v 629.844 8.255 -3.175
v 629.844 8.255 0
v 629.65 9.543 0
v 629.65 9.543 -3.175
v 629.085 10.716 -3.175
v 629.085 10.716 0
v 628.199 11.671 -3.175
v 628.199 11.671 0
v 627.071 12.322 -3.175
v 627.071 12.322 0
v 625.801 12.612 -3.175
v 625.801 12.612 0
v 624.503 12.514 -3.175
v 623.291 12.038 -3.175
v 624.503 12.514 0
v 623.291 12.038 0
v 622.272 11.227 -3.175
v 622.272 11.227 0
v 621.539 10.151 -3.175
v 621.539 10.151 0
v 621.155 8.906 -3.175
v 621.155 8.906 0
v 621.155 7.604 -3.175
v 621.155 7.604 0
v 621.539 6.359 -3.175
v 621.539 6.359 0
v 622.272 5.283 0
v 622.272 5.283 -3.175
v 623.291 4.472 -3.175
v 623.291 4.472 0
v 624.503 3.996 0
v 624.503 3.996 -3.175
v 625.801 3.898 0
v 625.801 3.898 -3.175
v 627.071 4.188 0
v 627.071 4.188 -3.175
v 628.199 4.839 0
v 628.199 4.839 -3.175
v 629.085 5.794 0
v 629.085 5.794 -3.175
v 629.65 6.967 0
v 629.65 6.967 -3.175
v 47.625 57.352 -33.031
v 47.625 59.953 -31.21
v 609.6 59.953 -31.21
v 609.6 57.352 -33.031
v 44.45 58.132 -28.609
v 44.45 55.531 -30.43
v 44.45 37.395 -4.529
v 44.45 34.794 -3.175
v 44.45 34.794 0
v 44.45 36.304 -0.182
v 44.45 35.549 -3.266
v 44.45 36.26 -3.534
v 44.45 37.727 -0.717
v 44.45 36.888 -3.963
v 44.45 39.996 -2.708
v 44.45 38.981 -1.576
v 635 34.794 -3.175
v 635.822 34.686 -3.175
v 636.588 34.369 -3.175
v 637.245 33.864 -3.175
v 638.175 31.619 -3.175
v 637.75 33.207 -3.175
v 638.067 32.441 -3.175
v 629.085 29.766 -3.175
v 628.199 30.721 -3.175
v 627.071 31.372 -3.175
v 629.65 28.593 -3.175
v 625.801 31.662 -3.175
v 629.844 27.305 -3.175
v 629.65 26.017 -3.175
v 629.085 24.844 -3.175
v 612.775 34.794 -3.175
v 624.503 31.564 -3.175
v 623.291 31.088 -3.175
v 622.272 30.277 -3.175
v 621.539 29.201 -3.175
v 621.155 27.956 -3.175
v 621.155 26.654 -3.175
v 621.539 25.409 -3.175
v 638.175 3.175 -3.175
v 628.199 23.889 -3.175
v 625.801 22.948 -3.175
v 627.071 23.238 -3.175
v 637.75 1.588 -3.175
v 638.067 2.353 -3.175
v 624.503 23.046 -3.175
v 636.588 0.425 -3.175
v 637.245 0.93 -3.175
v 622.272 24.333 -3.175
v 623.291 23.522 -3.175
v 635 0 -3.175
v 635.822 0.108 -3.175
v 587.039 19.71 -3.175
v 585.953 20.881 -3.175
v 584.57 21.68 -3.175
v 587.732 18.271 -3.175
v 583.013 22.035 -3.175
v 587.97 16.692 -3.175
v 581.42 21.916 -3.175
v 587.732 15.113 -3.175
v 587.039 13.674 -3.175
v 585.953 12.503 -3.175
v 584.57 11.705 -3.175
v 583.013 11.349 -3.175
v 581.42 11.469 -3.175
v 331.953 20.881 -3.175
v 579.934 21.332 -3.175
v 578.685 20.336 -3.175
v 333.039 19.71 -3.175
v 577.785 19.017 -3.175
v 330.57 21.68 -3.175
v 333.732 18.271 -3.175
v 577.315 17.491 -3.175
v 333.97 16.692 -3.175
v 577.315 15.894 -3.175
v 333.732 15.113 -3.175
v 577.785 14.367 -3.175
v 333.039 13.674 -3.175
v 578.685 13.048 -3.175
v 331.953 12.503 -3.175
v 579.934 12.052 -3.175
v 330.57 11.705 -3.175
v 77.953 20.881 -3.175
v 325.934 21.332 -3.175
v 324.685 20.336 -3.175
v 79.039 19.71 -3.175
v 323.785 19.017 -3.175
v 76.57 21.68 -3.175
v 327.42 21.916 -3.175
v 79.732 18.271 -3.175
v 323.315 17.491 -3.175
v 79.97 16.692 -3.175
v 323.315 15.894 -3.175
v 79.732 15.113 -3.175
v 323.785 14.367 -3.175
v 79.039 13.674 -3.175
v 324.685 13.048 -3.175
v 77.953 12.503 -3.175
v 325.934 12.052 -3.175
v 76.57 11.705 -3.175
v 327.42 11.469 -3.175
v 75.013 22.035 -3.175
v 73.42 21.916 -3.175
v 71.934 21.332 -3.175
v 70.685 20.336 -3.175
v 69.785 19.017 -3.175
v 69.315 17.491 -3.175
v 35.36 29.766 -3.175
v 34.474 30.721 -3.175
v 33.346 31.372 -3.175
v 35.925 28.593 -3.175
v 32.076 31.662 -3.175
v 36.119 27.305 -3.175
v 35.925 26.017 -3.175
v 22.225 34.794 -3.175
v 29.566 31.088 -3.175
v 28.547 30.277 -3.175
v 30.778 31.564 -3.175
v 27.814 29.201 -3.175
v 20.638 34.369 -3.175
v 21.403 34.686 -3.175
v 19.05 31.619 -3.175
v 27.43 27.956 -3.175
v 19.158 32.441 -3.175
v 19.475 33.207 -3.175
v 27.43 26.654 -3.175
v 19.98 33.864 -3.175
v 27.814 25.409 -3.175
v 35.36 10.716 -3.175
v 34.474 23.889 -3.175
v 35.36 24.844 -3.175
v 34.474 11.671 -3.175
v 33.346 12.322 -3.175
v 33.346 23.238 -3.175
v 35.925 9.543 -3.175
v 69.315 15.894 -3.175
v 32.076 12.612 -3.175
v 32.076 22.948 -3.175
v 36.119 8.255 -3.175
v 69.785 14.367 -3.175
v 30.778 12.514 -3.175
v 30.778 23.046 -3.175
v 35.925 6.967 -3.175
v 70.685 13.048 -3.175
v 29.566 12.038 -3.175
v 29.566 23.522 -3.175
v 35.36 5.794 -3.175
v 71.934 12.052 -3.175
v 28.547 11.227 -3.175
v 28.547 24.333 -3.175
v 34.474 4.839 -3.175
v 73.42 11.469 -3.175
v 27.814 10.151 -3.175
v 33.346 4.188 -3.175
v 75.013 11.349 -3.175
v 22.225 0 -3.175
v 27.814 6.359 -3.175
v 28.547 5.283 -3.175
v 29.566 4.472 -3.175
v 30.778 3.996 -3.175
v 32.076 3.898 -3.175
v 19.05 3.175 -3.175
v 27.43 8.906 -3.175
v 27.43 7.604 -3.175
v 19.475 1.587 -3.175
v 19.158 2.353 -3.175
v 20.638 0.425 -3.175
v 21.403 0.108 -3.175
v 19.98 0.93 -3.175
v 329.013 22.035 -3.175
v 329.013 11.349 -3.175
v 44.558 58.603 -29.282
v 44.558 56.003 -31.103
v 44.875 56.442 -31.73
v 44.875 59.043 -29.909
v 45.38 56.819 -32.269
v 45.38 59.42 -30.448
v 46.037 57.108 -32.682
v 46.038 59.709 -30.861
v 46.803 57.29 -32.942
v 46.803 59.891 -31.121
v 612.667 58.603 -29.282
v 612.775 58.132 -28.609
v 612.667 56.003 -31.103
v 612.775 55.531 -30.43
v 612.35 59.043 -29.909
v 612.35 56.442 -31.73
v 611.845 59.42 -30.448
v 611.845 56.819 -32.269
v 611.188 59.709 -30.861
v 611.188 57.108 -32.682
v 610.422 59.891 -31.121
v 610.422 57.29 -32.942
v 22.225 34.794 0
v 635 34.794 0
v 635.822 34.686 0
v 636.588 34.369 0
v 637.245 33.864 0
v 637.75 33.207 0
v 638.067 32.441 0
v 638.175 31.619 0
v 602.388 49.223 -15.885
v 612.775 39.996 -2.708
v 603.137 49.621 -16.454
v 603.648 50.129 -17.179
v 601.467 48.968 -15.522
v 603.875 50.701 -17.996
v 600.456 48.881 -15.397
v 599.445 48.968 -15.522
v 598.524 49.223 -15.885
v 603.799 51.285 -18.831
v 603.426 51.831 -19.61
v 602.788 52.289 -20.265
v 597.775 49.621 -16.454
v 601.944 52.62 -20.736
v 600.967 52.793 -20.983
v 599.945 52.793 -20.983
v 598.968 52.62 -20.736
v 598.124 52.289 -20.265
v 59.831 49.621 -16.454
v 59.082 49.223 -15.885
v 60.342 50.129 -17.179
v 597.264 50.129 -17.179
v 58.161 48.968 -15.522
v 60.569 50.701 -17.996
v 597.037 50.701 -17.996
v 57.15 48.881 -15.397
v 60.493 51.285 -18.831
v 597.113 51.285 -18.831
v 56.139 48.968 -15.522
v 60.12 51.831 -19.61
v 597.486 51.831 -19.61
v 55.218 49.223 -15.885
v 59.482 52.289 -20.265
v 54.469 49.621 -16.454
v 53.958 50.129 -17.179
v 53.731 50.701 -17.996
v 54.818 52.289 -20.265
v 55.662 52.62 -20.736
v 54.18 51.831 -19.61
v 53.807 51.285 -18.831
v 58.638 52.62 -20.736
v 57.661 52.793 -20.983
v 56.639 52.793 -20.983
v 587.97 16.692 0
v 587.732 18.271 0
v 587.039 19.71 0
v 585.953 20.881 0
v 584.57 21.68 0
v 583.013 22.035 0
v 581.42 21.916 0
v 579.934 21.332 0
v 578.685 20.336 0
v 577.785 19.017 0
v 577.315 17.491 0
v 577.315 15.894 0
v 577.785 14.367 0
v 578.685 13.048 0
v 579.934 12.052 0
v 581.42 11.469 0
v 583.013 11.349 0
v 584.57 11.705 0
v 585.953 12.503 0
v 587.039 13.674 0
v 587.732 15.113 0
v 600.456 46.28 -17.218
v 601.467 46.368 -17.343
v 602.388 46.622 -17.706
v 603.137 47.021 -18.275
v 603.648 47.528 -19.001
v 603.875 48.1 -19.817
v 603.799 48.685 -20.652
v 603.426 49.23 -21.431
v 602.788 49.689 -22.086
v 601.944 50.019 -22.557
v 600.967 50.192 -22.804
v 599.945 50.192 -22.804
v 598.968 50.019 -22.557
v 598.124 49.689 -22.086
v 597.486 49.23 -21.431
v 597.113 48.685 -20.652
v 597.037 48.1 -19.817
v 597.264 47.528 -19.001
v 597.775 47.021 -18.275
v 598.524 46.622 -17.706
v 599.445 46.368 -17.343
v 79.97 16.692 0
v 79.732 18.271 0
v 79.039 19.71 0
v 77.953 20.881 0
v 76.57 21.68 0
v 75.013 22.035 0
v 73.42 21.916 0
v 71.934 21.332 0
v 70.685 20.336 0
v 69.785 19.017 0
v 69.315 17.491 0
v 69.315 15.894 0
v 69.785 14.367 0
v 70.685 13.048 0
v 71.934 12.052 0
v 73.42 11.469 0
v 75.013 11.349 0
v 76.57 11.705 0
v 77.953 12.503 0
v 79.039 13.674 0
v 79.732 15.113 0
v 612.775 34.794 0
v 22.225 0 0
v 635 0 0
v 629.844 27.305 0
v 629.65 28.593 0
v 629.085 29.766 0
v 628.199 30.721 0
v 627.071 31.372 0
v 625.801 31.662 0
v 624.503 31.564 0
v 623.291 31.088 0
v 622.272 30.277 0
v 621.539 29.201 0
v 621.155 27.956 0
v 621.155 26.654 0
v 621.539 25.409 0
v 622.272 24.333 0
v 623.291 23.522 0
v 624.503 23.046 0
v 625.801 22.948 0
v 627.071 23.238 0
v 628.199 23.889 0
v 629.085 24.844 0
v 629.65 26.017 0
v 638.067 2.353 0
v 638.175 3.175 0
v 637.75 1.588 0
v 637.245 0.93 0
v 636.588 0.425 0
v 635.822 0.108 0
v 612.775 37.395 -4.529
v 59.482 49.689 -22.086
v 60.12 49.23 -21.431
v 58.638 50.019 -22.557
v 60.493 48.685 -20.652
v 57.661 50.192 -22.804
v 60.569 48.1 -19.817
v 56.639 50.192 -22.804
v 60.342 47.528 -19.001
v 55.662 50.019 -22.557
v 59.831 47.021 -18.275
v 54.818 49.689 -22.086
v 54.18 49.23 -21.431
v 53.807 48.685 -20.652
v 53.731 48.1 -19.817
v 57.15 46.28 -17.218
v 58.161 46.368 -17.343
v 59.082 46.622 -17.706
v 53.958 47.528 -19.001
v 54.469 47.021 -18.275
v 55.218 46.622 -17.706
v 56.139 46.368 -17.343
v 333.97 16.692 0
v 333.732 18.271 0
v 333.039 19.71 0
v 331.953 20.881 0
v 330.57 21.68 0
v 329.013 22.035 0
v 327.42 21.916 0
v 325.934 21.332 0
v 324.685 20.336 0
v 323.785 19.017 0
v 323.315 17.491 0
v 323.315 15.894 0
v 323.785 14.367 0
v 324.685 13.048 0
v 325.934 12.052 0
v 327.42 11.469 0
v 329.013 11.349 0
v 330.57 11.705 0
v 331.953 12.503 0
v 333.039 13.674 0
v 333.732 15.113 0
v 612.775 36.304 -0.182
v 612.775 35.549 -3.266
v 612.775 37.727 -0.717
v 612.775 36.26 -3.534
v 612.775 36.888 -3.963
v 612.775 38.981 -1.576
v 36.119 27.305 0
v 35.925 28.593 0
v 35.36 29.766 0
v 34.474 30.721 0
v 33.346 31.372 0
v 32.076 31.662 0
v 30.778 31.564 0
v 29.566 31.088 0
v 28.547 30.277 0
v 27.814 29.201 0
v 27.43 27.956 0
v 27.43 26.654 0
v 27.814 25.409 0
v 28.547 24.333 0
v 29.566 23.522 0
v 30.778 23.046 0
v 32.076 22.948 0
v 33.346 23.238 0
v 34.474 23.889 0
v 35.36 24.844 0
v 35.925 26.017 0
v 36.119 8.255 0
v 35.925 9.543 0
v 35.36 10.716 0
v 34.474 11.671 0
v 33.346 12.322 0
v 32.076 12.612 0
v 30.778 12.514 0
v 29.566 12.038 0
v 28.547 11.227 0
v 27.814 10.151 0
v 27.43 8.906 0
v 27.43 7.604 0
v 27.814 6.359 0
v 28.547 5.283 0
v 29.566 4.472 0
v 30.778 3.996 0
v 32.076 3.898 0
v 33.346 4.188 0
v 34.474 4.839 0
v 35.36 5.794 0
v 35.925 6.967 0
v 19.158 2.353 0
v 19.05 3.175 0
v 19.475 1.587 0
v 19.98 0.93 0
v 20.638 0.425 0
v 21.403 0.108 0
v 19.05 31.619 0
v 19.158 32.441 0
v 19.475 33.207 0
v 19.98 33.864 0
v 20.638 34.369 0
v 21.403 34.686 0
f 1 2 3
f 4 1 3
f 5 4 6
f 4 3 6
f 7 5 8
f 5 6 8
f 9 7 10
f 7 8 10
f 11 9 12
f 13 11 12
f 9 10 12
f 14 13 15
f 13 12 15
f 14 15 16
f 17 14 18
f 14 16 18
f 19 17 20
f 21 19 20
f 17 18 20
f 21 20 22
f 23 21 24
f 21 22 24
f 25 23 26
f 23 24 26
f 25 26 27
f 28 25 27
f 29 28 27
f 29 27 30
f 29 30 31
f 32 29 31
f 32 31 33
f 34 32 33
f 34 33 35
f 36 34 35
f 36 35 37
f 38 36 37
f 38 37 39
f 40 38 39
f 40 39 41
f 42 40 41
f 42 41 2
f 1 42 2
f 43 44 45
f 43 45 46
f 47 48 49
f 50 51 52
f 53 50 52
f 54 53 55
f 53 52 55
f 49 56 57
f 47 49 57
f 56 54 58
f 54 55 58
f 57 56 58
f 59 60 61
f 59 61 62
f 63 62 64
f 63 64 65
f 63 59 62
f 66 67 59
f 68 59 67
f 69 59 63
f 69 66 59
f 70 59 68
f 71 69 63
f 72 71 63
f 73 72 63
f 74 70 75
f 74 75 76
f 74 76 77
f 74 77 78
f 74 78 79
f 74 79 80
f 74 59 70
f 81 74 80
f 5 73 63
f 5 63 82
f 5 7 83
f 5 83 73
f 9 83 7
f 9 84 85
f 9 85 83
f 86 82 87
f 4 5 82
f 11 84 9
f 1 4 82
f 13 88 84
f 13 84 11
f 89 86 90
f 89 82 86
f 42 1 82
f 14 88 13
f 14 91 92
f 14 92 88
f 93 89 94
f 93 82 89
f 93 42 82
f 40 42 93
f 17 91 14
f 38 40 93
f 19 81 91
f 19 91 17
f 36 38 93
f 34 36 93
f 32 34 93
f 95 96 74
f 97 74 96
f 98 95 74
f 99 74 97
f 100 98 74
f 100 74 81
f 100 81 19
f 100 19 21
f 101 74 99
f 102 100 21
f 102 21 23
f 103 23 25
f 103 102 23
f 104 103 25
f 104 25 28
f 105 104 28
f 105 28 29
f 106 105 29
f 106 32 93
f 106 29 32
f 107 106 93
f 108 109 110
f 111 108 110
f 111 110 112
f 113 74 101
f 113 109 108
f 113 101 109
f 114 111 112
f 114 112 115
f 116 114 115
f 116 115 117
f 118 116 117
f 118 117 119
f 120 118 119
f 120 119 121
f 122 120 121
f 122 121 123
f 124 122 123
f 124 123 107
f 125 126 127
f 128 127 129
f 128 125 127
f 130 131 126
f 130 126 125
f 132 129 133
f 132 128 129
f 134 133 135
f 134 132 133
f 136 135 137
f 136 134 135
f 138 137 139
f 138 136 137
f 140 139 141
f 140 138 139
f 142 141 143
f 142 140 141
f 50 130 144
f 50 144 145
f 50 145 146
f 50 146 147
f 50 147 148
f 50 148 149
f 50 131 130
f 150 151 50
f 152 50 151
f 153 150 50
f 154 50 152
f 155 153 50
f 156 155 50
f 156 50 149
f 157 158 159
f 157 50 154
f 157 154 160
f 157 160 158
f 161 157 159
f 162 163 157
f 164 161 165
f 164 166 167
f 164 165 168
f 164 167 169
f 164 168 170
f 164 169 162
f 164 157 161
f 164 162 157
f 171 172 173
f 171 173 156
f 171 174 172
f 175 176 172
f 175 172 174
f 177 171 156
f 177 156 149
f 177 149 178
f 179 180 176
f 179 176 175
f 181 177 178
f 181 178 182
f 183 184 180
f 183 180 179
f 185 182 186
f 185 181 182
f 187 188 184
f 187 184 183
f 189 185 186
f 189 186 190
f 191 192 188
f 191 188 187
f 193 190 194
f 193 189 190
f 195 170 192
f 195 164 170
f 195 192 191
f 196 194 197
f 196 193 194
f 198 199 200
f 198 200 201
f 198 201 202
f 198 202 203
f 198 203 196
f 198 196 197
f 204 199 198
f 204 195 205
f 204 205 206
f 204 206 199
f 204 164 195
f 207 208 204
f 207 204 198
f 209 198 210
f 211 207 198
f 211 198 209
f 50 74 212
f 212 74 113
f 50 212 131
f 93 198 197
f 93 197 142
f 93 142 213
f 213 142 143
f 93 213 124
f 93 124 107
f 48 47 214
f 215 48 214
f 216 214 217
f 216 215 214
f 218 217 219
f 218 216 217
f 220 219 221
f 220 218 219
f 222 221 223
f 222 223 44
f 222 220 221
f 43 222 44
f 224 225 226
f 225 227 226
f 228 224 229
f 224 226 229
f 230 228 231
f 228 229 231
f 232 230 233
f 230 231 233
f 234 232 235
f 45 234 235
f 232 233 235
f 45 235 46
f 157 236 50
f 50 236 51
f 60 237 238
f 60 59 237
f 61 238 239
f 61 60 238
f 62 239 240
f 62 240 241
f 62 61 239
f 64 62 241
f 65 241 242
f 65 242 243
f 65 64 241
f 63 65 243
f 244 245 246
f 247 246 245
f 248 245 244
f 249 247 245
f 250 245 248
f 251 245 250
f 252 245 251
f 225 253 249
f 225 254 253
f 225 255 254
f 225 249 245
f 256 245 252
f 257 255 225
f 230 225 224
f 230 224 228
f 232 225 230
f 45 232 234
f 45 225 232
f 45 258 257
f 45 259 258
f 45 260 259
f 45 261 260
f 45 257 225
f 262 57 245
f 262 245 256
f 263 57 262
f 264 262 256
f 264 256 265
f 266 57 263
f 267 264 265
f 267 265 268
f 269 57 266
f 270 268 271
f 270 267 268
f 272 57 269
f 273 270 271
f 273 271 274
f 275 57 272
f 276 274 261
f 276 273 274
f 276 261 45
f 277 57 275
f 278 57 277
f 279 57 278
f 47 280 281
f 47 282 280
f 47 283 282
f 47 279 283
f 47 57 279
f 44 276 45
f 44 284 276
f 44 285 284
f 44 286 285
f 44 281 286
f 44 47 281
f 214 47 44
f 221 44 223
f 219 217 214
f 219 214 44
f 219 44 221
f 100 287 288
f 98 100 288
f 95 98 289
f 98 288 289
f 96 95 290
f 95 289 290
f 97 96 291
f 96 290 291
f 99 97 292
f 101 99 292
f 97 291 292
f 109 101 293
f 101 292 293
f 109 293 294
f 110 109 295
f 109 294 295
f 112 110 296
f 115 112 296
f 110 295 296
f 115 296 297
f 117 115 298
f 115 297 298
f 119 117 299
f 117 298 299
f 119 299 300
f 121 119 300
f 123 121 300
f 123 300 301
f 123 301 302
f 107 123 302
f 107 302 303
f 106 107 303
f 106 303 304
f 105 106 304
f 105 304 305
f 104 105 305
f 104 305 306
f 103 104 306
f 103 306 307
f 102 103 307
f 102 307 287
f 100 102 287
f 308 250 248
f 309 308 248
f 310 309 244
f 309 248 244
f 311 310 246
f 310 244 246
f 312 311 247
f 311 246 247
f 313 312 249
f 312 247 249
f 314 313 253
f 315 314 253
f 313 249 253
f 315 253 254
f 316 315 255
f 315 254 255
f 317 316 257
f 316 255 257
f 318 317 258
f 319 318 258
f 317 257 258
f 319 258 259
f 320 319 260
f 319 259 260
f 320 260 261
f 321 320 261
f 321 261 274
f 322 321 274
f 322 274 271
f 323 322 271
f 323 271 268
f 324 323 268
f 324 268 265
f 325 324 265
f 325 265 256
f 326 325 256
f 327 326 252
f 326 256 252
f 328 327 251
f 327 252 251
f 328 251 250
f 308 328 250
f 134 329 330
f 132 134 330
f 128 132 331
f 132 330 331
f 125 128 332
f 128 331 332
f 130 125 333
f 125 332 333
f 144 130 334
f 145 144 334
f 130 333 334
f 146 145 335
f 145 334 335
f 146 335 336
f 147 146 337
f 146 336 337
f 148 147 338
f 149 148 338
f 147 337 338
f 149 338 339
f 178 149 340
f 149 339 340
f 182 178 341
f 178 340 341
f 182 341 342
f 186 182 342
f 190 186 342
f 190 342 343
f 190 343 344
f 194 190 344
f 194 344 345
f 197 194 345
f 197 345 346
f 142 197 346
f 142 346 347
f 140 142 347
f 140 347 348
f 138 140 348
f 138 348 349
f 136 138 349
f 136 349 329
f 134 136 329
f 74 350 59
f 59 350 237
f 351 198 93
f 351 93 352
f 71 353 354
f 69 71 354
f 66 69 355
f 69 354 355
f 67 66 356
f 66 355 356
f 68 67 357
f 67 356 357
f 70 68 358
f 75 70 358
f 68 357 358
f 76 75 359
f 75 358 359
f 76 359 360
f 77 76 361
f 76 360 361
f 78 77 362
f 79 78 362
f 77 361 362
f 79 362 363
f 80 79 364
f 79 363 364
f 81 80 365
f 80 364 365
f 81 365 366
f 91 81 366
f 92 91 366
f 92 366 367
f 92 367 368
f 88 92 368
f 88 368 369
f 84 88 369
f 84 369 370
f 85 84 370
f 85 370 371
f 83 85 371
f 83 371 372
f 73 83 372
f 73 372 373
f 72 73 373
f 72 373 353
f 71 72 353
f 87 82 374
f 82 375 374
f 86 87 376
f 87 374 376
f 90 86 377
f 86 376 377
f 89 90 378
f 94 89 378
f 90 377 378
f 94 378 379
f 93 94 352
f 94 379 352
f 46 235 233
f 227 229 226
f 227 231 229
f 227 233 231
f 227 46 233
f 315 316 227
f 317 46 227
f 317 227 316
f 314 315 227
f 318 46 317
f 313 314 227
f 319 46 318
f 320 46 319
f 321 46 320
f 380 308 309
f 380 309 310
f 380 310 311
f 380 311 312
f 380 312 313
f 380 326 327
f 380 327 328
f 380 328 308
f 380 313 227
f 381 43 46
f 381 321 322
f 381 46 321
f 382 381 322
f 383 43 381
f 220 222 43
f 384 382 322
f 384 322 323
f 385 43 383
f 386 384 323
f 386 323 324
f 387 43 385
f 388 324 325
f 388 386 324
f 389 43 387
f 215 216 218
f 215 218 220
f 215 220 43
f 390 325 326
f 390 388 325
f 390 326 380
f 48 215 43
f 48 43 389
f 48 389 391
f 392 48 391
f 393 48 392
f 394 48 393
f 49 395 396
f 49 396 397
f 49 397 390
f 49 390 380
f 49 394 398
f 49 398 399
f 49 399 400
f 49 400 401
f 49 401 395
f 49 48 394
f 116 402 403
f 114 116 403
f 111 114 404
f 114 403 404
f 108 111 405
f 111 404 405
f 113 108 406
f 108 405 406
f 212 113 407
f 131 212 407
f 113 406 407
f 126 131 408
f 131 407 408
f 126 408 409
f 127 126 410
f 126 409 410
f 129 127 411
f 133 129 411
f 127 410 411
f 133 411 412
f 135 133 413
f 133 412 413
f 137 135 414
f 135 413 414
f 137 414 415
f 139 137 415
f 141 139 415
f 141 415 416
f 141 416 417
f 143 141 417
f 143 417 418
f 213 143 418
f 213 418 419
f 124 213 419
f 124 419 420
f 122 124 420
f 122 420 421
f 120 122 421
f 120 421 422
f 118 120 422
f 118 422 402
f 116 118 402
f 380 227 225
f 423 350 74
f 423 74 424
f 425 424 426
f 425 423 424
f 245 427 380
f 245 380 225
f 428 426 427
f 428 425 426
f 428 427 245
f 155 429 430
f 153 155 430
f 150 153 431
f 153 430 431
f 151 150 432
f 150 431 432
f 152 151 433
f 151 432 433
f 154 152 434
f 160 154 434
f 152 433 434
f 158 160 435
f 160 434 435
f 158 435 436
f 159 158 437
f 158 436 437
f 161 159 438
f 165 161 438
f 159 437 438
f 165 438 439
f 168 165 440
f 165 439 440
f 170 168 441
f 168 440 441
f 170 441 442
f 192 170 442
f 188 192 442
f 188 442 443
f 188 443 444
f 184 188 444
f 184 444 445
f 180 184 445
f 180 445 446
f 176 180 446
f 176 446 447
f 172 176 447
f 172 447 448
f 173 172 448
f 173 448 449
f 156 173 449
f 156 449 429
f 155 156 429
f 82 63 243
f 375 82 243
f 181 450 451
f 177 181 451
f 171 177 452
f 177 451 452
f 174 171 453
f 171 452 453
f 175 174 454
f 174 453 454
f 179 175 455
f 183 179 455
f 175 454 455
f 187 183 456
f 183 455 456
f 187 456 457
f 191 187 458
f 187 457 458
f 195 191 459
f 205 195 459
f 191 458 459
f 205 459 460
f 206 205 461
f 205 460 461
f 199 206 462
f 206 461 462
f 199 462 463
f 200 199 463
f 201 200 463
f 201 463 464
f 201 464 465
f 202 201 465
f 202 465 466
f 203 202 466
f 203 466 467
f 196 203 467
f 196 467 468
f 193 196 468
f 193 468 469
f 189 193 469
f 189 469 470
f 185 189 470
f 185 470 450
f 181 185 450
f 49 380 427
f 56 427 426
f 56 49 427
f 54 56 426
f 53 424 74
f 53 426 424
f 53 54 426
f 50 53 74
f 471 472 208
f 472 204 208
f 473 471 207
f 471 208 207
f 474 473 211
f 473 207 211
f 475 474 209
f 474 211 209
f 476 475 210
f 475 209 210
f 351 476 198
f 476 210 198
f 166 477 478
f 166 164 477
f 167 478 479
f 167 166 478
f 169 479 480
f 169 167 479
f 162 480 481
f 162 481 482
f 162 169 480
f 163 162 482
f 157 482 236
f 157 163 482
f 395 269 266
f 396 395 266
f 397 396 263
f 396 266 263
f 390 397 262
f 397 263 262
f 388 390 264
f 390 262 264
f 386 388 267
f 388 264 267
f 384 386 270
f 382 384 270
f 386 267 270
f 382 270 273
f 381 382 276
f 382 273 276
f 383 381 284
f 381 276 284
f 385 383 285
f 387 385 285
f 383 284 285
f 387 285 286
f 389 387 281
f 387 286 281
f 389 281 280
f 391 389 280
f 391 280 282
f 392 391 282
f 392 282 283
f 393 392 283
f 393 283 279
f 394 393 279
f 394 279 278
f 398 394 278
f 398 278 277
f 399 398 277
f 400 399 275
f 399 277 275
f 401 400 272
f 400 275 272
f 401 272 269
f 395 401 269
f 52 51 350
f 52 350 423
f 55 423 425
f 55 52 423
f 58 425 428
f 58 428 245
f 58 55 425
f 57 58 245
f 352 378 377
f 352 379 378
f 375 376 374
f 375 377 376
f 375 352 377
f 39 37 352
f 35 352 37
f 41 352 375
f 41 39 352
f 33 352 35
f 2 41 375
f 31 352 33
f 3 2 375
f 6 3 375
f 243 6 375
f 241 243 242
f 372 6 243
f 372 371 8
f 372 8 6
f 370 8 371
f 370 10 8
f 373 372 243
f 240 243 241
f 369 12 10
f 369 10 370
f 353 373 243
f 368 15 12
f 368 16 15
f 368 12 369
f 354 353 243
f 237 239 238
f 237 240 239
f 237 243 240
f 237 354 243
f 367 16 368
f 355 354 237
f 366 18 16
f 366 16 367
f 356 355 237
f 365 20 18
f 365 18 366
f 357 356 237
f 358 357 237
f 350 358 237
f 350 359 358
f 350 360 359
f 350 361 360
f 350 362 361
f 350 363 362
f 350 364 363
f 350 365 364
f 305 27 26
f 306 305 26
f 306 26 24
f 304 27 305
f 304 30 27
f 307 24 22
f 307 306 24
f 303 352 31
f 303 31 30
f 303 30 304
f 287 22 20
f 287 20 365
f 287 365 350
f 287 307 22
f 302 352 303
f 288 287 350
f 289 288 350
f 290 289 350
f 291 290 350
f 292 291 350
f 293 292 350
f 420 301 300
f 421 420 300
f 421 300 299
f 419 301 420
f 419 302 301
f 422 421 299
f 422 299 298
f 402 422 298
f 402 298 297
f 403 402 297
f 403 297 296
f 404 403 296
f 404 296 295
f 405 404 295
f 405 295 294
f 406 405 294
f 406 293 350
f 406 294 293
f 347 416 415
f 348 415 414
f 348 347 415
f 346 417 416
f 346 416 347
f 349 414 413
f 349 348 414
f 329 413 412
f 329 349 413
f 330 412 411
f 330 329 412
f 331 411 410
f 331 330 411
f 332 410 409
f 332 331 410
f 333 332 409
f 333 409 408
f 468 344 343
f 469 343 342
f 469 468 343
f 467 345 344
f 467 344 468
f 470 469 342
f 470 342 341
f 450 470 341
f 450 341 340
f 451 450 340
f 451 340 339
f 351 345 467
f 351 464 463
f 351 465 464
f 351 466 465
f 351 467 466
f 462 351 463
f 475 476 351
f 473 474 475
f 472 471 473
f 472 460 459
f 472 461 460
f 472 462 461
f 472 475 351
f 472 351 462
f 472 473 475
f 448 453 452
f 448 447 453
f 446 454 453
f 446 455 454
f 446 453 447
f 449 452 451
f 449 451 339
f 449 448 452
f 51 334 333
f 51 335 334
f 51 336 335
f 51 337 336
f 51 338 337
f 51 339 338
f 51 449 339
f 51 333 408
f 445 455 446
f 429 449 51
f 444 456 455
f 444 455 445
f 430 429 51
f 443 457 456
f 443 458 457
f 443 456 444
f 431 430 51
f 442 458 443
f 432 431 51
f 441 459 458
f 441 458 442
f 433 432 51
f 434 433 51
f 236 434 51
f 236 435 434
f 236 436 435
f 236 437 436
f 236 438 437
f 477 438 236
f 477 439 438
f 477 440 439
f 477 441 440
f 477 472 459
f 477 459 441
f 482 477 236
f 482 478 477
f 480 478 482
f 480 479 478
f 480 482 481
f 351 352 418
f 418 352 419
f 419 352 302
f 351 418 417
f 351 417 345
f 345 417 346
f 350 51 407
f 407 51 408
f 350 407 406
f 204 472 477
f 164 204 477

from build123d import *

# Parameters (mm, degrees)
BASE_FLANGE1_DEPTH = 638.175
SKETCH6_R          = 4.3688
SKETCH6_R_2        = 5.3578125
SKETCH6_W          = 25.4
SKETCH6_H          = 25.158862996
CUT_EXTRUDE1_DEPTH = 642.835460144
SKETCH8_R          = 3.429
CUT_EXTRUDE2_DEPTH = 3.175
FILLET1_R          = 3.175


# Sheet-metal steps are written as plain solids
with BuildPart() as part:
    # Sketch1 → Base-Flange1 (new body)
    with BuildSketch(Plane(origin=(0, 0, 0), x_dir=(0, 0, -1), z_dir=(1, 0, 0))):
        with BuildLine():
            Line((0, 0), (0, 34.794399229))
            ThreePointArc((0, 34.794399229), (0.717481209, 37.726502923), (2.707789629, 39.99601471))
            Line((2.707789629, 39.99601471), (31.209692887, 59.953262225))
            Line((31.209692887, 59.953262225), (33.030798073, 57.352454484))
            Line((33.030798073, 57.352454484), (4.528894815, 37.39520697))
            ThreePointArc((4.528894815, 37.39520697), (3.533740605, 36.260451076), (3.175, 34.794399229))
            Line((3.175, 34.794399229), (3.175, 0))
            Line((3.175, 0), (0, 0))
        make_face()
    extrude(amount=BASE_FLANGE1_DEPTH)

    # Sketch6 → Cut-Extrude1 (cut, through all)
    with BuildSketch(Plane.XY):
        with Locations((31.75, 27.305)):
            Circle(SKETCH6_R)
        with Locations((31.75, 8.255)):
            Circle(SKETCH6_R)
        with Locations((625.475, 27.305)):
            Circle(SKETCH6_R)
        with Locations((625.475, 8.255)):
            Circle(SKETCH6_R)
        with Locations((74.6125, 16.69209113)):
            Circle(SKETCH6_R_2)
        with Locations((328.6125, 16.69209113)):
            Circle(SKETCH6_R_2)
        with Locations((582.6125, 16.69209113)):
            Circle(SKETCH6_R_2)
        Polygon((19.05, 34.794399229), (44.45, 34.794399229), (44.45, 59.953262225), (0, 59.953262225), (0, 0), (19.05, 0), align=None)
        with Locations((625.475, 47.373830727)):
            Rectangle(SKETCH6_W, SKETCH6_H)
    extrude(amount=-CUT_EXTRUDE1_DEPTH, mode=Mode.SUBTRACT)

    # Sketch8 → Cut-Extrude2 (cut)
    with BuildSketch(Plane(origin=(0, 25.56548373, 17.901144426), x_dir=(1, 0, 0), z_dir=(0, 0.8191520442889929, 0.5735764363510447))):
        with Locations(Location((57.15, 44.078262225, 0), (0, 0, 270))):
            Circle(SKETCH8_R)
        with Locations(Location((600.456, 44.078262225, 0), (0, 0, 270))):
            Circle(SKETCH8_R)
    extrude(amount=-CUT_EXTRUDE2_DEPTH, mode=Mode.SUBTRACT)

    # Fillet1
    fillet1_edges = [part.edges().sort_by_distance(p)[0] for p in [
        (638.175, 34.794399229, -1.5875),
        (638.175, 0, -1.5875),
        (612.775, 58.652858355, -32.12024548),
        (19.05, 0, -1.5875),
        (44.45, 58.652858355, -32.12024548),
        (19.05, 34.794399229, -1.5875),
    ]]
    fillet(fillet1_edges, radius=FILLET1_R)


solid = part.part
